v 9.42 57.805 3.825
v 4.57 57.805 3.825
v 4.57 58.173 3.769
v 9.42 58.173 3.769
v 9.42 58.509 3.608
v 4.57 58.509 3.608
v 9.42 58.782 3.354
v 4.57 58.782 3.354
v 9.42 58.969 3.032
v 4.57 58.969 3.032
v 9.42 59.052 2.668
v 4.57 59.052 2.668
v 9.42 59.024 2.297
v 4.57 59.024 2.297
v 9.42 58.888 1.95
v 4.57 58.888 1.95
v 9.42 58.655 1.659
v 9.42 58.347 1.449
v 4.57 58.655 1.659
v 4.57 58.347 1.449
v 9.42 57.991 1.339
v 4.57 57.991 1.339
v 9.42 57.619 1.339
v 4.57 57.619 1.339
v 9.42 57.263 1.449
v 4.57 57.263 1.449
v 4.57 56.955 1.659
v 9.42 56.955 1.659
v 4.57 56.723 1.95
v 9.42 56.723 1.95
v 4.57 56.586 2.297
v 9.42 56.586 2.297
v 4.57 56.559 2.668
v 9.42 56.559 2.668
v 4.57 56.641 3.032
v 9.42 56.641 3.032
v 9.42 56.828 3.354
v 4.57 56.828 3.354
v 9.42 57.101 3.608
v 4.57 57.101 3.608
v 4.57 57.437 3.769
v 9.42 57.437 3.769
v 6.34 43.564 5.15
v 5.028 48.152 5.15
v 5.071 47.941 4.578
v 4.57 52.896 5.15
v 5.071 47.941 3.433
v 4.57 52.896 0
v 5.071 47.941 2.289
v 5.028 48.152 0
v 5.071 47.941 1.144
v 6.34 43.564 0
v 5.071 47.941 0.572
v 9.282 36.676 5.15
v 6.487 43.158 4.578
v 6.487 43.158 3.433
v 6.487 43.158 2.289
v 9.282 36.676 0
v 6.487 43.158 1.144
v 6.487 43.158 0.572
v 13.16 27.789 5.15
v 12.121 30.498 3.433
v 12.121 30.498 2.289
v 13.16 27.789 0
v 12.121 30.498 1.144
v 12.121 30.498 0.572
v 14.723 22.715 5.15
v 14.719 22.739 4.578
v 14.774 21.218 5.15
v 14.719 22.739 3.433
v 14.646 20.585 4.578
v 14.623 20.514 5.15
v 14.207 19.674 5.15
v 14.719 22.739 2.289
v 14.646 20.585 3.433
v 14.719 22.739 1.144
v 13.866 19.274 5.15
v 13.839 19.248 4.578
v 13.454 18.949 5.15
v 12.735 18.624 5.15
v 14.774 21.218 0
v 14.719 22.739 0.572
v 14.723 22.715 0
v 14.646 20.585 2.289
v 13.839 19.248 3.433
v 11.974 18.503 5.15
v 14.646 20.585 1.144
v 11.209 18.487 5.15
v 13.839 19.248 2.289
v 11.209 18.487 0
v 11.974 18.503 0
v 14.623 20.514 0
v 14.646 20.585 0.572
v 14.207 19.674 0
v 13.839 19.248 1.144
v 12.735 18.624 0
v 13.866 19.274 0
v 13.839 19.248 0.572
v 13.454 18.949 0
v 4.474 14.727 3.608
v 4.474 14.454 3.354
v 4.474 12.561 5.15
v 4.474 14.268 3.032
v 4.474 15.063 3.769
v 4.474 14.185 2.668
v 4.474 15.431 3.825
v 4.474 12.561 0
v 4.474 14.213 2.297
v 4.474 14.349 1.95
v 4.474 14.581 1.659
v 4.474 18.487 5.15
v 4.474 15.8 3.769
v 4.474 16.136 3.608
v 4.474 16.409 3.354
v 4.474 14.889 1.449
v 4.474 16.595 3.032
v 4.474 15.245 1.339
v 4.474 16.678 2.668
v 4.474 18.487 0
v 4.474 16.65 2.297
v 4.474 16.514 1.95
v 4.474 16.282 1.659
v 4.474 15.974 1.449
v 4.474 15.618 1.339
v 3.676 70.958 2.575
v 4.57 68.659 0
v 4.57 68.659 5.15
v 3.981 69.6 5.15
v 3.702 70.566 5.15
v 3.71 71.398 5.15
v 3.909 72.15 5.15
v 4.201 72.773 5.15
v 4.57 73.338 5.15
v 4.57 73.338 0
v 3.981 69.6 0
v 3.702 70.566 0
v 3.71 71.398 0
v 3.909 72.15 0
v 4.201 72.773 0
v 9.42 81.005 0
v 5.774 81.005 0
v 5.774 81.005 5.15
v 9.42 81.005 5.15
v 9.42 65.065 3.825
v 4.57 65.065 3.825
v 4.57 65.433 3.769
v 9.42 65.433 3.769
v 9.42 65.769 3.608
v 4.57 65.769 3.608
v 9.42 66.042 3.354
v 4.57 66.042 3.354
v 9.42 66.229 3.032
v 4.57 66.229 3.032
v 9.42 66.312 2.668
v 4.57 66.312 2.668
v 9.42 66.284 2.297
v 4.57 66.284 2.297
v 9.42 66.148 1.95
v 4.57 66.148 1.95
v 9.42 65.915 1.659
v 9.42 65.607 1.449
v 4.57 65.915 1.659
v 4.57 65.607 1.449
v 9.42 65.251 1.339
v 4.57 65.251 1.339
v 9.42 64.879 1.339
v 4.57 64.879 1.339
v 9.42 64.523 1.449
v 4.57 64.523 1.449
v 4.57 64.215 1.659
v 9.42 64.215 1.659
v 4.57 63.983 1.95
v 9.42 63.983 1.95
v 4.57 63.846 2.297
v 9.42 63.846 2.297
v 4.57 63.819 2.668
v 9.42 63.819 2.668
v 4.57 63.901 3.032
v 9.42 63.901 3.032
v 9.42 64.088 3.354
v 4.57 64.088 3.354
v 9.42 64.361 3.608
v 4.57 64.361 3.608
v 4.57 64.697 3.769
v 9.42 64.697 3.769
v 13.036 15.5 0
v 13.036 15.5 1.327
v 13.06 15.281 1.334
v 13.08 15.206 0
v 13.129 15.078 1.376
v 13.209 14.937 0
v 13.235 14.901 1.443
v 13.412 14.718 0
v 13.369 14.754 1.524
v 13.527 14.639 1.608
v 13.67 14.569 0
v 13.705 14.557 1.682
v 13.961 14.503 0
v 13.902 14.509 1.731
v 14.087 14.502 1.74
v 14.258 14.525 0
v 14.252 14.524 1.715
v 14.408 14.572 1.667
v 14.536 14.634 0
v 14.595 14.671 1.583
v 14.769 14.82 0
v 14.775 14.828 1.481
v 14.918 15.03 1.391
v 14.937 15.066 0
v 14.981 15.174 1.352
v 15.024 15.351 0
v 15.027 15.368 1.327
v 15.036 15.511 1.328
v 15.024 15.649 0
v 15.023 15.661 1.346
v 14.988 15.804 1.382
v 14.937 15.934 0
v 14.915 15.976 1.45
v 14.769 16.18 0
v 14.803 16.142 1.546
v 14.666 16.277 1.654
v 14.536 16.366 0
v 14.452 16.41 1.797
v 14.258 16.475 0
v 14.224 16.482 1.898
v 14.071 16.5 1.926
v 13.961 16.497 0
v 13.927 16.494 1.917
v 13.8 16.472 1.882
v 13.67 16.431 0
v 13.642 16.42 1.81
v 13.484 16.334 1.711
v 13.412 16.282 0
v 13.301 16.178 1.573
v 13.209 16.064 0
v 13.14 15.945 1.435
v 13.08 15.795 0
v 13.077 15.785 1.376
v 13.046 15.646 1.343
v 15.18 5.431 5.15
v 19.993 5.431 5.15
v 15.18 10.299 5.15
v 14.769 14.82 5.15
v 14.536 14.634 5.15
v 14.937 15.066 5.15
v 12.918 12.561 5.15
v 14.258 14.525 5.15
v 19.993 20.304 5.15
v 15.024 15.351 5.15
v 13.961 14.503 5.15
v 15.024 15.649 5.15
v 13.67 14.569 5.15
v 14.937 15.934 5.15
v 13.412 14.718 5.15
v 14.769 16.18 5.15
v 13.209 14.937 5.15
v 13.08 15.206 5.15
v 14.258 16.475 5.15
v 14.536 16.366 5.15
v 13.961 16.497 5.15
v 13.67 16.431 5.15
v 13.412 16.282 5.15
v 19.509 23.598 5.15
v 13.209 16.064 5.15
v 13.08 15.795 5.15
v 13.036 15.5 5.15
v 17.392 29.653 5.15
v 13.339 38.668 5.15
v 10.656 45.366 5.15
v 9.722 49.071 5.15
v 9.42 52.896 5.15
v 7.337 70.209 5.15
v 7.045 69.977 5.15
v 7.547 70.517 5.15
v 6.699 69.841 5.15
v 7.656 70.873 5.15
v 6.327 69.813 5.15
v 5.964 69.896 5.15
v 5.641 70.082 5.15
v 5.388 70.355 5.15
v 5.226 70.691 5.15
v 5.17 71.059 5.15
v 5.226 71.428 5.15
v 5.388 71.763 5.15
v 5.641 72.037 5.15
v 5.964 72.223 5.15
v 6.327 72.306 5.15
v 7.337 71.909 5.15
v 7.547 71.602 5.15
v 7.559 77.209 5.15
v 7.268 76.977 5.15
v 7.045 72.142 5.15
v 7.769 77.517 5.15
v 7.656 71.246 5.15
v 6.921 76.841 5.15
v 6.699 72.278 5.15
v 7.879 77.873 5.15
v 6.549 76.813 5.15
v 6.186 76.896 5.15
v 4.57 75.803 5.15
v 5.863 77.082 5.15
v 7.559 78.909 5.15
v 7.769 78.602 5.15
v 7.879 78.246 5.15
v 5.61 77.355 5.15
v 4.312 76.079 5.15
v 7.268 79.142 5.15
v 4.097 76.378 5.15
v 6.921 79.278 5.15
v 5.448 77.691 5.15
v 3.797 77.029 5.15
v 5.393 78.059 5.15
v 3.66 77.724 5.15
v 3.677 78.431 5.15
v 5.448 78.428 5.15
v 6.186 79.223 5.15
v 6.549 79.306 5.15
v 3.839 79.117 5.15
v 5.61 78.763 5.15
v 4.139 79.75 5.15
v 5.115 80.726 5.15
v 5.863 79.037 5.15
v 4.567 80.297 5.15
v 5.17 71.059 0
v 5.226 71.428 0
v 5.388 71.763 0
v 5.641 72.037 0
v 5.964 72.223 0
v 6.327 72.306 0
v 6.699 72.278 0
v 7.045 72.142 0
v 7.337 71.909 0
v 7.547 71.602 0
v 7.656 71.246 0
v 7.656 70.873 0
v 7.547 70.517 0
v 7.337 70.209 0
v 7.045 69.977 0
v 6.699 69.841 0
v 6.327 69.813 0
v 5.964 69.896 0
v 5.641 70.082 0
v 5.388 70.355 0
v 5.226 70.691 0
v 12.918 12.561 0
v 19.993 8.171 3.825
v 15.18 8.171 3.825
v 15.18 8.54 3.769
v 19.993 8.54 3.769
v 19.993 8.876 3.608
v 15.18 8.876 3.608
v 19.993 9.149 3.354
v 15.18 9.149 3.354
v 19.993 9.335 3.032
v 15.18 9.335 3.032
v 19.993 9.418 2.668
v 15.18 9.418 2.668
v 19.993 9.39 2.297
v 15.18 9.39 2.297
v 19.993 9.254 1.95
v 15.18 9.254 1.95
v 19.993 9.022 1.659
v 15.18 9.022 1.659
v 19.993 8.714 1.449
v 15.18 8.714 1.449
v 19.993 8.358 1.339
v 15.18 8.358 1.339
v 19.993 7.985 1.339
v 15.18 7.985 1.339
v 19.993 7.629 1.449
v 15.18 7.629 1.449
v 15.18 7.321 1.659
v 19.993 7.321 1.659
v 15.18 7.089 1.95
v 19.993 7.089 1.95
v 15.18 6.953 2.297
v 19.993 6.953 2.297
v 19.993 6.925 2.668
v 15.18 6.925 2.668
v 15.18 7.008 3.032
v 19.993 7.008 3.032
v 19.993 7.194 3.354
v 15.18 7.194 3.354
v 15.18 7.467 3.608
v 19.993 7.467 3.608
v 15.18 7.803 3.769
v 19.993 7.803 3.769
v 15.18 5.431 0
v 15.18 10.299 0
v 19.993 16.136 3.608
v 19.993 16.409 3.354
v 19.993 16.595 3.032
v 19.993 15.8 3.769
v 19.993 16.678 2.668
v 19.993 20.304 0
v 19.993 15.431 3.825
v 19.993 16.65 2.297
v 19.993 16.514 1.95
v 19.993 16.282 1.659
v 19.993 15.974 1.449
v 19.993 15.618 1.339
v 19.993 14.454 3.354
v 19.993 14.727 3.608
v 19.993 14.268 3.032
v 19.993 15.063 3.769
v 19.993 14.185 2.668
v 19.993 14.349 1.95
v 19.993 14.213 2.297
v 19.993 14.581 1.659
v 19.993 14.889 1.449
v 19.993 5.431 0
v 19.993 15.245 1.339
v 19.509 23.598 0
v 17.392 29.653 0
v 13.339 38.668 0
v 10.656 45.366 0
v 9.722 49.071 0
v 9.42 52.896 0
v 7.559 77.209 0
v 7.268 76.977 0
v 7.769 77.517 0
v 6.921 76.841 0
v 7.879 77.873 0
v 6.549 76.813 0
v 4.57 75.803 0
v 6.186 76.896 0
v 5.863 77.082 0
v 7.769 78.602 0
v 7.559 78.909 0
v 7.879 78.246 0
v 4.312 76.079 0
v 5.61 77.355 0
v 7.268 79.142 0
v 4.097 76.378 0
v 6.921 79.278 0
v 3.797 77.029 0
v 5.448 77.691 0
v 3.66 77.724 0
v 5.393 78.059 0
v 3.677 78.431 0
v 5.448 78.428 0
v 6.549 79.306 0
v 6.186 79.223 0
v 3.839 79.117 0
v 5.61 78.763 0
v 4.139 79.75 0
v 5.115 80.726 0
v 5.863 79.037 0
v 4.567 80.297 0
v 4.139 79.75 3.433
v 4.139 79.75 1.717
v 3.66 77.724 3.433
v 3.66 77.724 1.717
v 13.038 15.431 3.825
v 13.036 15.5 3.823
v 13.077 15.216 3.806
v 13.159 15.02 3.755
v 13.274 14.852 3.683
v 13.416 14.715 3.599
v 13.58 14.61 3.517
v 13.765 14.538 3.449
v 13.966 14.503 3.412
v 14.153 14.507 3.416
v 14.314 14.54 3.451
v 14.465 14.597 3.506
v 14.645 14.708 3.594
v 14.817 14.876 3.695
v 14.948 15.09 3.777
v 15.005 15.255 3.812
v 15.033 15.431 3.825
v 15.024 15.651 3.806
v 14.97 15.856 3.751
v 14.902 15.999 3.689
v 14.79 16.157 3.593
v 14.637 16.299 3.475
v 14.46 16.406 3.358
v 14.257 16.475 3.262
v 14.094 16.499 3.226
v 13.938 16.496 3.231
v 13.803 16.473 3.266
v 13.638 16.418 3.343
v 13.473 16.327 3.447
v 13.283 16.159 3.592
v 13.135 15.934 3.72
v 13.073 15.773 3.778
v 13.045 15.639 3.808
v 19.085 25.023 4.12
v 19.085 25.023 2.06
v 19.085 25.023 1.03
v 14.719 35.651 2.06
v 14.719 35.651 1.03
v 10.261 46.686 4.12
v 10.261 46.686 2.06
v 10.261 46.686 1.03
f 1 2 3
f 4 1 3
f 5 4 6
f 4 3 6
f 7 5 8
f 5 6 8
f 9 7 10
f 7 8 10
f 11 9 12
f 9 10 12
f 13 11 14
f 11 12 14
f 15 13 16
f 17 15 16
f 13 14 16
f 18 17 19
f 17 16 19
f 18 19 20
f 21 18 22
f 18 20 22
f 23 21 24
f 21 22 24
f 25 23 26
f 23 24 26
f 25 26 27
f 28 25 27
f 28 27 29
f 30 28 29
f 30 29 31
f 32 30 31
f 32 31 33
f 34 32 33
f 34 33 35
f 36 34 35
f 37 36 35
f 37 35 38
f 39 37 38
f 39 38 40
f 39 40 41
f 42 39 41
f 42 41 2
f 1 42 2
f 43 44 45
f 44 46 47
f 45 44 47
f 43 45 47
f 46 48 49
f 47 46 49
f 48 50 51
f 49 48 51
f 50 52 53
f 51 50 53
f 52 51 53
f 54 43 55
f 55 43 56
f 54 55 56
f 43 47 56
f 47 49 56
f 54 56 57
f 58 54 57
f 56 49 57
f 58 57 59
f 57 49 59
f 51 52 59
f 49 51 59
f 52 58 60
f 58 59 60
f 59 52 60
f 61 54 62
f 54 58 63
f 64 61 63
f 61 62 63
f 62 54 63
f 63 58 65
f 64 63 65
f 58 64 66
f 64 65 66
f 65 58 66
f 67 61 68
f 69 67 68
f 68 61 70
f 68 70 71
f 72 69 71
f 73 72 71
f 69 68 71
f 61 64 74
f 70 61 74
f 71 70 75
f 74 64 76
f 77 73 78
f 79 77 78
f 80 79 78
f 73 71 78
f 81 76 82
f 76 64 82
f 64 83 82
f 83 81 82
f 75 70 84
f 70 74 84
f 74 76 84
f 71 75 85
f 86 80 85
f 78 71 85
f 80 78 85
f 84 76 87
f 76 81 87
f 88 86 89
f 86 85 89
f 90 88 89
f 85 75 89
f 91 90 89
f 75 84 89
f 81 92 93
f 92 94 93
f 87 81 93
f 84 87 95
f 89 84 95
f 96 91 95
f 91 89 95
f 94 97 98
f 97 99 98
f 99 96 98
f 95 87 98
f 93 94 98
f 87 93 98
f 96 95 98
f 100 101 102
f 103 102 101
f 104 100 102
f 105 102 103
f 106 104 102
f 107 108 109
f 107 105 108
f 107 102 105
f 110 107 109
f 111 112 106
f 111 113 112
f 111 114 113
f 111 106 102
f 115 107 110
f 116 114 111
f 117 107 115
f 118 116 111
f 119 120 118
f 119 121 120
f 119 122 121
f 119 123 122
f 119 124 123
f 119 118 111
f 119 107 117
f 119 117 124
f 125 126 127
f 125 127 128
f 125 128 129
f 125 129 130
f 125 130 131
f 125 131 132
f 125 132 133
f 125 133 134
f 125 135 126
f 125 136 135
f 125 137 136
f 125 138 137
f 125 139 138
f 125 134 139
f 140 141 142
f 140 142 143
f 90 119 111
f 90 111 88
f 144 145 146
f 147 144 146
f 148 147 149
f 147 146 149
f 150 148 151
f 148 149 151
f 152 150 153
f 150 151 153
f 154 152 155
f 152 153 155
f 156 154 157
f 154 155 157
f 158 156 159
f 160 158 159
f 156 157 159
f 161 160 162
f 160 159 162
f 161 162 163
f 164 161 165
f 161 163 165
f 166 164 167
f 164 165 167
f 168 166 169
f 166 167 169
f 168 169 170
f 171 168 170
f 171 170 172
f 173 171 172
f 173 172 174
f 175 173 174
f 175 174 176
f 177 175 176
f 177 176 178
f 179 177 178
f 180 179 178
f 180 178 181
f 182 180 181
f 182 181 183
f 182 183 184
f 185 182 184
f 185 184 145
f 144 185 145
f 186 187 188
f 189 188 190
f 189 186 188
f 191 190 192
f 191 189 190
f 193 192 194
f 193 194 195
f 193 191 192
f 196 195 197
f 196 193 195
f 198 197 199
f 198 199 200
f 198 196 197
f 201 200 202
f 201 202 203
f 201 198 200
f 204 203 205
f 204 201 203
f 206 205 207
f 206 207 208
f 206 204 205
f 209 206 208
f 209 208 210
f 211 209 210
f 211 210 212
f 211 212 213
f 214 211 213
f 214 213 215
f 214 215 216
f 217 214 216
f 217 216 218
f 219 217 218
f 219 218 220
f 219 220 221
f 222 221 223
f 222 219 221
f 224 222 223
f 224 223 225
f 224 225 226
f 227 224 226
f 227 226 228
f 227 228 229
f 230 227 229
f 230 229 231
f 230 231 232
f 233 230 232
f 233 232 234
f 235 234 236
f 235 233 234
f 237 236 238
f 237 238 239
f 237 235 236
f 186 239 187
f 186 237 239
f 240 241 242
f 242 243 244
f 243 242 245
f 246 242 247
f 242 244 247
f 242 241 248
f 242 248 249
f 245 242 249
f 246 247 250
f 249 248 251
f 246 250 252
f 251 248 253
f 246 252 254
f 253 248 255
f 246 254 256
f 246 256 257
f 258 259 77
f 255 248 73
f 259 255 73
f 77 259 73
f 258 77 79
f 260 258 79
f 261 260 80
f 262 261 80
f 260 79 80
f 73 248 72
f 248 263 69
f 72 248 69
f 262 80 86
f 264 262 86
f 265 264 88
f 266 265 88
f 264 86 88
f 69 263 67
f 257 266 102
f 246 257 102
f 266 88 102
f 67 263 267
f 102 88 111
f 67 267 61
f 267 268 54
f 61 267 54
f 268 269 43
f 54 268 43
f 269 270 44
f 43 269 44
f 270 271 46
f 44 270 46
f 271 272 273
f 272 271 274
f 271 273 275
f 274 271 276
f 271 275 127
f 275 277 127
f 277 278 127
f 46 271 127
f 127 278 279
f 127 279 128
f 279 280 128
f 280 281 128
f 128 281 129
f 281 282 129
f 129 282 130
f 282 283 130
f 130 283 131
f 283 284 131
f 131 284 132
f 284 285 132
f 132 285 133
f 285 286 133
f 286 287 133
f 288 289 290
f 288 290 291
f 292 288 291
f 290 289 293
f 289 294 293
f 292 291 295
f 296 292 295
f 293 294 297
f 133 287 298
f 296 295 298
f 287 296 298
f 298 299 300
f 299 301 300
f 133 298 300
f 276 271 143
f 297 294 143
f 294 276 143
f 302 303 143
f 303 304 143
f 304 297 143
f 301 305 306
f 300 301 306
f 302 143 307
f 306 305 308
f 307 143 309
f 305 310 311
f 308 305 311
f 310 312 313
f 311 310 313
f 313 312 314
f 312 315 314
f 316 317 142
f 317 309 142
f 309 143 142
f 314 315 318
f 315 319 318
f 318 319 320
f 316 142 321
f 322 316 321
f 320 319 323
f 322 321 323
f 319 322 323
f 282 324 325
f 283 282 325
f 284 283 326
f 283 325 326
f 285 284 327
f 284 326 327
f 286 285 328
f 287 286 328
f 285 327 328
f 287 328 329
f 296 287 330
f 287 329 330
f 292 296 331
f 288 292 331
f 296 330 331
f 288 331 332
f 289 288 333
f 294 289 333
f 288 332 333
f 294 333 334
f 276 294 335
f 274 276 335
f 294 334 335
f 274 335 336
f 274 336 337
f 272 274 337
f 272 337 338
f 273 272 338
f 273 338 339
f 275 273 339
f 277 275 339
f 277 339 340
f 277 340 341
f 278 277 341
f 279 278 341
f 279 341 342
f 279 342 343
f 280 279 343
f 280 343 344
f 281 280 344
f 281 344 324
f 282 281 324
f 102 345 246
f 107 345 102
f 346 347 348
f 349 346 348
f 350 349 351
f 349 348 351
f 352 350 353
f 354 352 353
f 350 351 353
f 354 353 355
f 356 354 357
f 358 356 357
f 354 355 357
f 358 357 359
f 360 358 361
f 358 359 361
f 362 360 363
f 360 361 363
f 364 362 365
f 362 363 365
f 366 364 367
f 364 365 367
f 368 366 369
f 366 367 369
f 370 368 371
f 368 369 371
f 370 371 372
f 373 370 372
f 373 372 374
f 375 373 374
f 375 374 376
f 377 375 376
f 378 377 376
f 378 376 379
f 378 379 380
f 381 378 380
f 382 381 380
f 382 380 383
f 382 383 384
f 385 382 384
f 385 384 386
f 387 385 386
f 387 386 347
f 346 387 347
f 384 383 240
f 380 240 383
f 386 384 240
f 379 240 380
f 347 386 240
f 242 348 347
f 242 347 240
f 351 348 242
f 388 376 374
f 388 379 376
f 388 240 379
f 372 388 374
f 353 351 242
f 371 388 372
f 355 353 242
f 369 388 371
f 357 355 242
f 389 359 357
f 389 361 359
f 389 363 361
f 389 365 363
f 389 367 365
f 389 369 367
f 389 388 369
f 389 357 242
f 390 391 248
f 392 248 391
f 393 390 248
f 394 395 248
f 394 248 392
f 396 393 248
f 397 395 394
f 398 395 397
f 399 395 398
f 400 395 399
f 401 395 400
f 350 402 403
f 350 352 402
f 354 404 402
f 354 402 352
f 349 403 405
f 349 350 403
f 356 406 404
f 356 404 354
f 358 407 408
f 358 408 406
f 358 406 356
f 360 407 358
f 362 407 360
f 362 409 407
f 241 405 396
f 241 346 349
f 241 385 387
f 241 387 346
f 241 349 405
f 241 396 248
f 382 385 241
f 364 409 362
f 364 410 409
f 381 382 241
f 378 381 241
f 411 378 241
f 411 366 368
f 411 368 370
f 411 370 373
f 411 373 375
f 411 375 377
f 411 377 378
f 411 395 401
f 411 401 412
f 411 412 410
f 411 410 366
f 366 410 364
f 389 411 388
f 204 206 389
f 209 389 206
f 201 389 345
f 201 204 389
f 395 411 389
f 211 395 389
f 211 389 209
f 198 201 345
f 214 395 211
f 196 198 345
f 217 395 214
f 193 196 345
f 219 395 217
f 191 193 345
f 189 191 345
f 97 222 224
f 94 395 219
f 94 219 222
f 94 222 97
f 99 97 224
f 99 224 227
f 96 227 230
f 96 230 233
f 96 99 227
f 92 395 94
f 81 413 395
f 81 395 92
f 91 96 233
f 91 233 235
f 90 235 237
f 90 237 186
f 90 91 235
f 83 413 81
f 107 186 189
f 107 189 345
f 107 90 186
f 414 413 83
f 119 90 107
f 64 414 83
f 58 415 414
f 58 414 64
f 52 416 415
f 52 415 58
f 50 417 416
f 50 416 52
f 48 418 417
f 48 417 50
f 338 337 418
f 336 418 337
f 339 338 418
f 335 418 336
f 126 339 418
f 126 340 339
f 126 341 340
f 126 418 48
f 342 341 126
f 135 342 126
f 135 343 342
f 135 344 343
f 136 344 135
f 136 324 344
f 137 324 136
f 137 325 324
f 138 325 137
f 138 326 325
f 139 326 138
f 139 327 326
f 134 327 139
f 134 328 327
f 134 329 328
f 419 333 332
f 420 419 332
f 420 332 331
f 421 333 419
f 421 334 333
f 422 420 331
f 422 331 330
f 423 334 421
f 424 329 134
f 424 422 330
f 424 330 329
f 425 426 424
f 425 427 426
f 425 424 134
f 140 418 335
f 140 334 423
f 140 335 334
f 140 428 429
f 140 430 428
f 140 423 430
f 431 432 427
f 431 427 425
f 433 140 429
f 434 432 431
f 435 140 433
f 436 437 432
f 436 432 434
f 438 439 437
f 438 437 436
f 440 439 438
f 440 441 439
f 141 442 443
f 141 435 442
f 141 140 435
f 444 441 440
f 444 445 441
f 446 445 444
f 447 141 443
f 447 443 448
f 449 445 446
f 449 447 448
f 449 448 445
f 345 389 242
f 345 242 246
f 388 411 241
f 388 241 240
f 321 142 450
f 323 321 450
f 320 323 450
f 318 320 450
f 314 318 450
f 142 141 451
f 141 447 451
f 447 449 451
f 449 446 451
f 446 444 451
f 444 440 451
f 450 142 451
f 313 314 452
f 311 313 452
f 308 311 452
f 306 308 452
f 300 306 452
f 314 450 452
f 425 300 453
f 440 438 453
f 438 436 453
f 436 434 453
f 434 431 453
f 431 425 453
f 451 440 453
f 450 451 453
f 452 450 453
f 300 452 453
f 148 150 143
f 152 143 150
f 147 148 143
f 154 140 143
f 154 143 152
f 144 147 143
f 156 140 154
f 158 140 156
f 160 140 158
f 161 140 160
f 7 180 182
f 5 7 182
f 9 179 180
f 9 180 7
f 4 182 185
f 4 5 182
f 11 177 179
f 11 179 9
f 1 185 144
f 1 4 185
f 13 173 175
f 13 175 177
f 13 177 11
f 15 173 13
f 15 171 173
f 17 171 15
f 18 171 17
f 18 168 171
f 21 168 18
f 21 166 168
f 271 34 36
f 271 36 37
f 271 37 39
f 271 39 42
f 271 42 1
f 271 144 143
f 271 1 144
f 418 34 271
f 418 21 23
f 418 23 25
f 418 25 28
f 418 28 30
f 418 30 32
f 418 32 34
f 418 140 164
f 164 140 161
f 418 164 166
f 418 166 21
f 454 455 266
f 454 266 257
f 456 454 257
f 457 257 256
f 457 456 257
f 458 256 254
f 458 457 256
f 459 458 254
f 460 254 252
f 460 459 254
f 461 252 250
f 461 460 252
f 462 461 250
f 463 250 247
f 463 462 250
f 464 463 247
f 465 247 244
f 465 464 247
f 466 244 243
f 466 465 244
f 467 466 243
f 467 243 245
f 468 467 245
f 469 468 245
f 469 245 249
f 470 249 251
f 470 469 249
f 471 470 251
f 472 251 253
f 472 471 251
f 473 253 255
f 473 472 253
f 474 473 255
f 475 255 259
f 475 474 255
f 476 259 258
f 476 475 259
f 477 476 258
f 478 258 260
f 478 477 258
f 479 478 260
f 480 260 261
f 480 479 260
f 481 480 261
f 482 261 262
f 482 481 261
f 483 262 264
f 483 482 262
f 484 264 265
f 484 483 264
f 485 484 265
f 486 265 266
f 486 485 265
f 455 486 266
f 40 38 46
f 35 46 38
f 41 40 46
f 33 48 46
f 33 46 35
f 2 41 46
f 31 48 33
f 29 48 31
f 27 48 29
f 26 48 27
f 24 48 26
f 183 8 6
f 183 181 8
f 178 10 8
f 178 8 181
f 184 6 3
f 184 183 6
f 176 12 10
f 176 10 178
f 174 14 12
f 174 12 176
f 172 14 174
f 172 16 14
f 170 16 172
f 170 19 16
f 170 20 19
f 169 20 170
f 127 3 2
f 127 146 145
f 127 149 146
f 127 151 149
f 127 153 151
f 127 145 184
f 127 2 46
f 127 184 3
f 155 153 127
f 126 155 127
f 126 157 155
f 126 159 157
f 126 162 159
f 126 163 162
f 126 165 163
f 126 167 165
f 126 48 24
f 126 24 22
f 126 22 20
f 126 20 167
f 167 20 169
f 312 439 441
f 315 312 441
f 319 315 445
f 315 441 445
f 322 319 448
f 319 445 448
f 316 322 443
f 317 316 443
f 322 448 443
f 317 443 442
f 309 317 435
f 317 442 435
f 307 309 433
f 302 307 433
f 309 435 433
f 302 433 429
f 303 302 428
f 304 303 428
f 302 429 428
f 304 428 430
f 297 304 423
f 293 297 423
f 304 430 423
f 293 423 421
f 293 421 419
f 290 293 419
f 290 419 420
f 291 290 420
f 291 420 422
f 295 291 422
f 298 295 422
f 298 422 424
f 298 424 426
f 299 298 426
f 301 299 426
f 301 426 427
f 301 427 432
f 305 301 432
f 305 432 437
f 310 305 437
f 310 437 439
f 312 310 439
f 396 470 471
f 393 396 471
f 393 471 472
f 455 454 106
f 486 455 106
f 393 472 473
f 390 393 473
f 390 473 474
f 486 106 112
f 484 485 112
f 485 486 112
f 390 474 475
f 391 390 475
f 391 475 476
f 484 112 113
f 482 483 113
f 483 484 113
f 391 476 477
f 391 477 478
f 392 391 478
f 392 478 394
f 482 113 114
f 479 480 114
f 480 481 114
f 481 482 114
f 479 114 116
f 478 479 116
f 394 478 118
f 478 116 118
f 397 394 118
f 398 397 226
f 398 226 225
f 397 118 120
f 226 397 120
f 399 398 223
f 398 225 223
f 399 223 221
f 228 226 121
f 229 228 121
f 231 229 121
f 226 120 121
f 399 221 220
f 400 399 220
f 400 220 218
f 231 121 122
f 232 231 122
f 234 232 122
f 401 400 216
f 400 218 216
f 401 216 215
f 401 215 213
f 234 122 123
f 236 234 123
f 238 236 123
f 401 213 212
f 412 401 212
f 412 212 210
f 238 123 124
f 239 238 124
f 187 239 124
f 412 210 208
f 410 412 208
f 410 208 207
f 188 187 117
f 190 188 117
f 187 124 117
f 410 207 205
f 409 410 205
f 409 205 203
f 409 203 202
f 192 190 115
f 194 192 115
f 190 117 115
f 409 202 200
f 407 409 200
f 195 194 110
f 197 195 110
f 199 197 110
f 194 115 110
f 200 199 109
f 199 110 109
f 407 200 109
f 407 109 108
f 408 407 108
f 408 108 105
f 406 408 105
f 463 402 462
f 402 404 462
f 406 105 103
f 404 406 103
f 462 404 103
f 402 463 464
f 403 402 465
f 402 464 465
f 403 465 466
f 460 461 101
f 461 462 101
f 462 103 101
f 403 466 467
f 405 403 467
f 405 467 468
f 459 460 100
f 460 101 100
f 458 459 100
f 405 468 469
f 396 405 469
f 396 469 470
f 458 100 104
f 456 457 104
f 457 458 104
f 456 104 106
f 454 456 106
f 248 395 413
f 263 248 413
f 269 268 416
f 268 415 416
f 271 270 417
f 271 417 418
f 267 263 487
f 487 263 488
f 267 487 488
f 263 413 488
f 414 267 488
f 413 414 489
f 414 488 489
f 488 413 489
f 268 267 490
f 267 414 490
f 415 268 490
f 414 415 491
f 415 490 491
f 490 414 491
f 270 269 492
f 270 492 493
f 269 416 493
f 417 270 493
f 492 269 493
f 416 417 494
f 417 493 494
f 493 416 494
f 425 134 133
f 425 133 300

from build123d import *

# Parameters (mm, degrees)
SCHIZZO1_R                   = 1
ESTRUSIONE_ESTRUSIONE1_DEPTH = 5.15
FORO_FILETTATO_M3X0_5_1_D    = 2.5
FORO_FILETTATO_M3X0_5_2_D    = 2.5


with BuildPart() as part:
    # Schizzo1 → Estrusione-Estrusione1 (new body)
    with BuildSketch(Plane.XY):
        with BuildLine():
            Line((5.774092887, 81.005050638), (9.420451412, 81.005050638))
            Line((9.420451412, 81.005050638), (9.420451412, 52.896037581))
            add(Edge.make_bspline(
                [(19.993180208, 20.304049613), (20.000392243, 21.937597291), (19.136290328, 25.09540445), (17.251117362, 30.199917591), (14.840967319, 35.376814158), (11.407074739, 42.841952294), (9.321298994, 48.642190699), (9.420451412, 52.896037581)],
                knots=[0, 0, 0, 0, 0.139682766, 0.283827316, 0.472965528, 0.635702962, 1, 1, 1, 1], degree=3))
            Line((19.993180208, 20.304049613), (19.993180208, 5.431477505))
            Line((19.993180208, 5.431477505), (15.180154721, 5.431477505))
            Line((15.180154721, 5.431477505), (15.180154721, 10.299047849))
            Line((15.180154721, 10.299047849), (12.918006965, 12.561195605))
            Line((12.918006965, 12.561195605), (4.47403255, 12.561195605))
            Line((4.47403255, 12.561195605), (4.47403255, 18.486652797))
            Line((4.47403255, 18.486652797), (11.20904805, 18.486652797))
            add(Edge.make_bspline(
                [(4.570340235, 52.896037581), (4.500981426, 49.543554951), (5.932867071, 43.955021228), (9.218772599, 36.723990517), (11.987968496, 31.114139773), (13.652178303, 26.417541941), (14.789252198, 23.160638336), (14.87184014, 20.739192121), (13.998789651, 19.218561632), (12.677613677, 18.480234626), (11.705324935, 18.486652797), (11.20904805, 18.486652797)],
                knots=[0, 0, 0, 0, 0.25872816, 0.443278346, 0.618370517, 0.745139829, 0.830875407, 0.886814382, 0.927349507, 0.960443227, 1, 1, 1, 1], degree=3))
            Line((4.570340235, 52.896037581), (4.570340235, 68.659015754))
            add(Edge.make_bspline(
                [(4.570340235, 68.659015754), (4.043420457, 69.286724479), (3.296904659, 70.986958522), (4.068519262, 72.668133187), (4.570340235, 73.338444315)],
                knots=[0, 0, 0, 0, 0.492973619, 1, 1, 1, 1], degree=3))
            Line((4.570340235, 73.338444315), (4.570340235, 75.802736339))
            add(Edge.make_bspline(
                [(5.774092887, 81.005050638), (3.638095606, 80.427239868), (2.887343432, 77.378785907), (4.570340235, 75.802736339)],
                knots=[0, 0, 0, 0, 1, 1, 1, 1], degree=3))
        make_face()
        with Locations(Location((14.035609494, 15.5002807, 0), (0, 0, 180))):
            Circle(SCHIZZO1_R, mode=Mode.SUBTRACT)
    extrude(amount=ESTRUSIONE_ESTRUSIONE1_DEPTH)

    # Foro filettato M3x0.5-1 (through all)
    with Locations(Plane.XY.offset(5.15)):
        with Locations((6.642606901, 78.059235381), (6.420451412, 71.059235381)):
            Hole(FORO_FILETTATO_M3X0_5_1_D / 2)

    # Foro filettato M3x0.5-2 (through all)
    with Locations(Plane(origin=(19.993180208, 0, 0), x_dir=(0, 0, -1), z_dir=(1, 0, 0))):
        with Locations((-2.575, 65.065050638), (-2.575, 57.805050638), (-2.575, 15.431477505), (-2.575, 8.171477505)):
            Hole(FORO_FILETTATO_M3X0_5_2_D / 2)


solid = part.part
